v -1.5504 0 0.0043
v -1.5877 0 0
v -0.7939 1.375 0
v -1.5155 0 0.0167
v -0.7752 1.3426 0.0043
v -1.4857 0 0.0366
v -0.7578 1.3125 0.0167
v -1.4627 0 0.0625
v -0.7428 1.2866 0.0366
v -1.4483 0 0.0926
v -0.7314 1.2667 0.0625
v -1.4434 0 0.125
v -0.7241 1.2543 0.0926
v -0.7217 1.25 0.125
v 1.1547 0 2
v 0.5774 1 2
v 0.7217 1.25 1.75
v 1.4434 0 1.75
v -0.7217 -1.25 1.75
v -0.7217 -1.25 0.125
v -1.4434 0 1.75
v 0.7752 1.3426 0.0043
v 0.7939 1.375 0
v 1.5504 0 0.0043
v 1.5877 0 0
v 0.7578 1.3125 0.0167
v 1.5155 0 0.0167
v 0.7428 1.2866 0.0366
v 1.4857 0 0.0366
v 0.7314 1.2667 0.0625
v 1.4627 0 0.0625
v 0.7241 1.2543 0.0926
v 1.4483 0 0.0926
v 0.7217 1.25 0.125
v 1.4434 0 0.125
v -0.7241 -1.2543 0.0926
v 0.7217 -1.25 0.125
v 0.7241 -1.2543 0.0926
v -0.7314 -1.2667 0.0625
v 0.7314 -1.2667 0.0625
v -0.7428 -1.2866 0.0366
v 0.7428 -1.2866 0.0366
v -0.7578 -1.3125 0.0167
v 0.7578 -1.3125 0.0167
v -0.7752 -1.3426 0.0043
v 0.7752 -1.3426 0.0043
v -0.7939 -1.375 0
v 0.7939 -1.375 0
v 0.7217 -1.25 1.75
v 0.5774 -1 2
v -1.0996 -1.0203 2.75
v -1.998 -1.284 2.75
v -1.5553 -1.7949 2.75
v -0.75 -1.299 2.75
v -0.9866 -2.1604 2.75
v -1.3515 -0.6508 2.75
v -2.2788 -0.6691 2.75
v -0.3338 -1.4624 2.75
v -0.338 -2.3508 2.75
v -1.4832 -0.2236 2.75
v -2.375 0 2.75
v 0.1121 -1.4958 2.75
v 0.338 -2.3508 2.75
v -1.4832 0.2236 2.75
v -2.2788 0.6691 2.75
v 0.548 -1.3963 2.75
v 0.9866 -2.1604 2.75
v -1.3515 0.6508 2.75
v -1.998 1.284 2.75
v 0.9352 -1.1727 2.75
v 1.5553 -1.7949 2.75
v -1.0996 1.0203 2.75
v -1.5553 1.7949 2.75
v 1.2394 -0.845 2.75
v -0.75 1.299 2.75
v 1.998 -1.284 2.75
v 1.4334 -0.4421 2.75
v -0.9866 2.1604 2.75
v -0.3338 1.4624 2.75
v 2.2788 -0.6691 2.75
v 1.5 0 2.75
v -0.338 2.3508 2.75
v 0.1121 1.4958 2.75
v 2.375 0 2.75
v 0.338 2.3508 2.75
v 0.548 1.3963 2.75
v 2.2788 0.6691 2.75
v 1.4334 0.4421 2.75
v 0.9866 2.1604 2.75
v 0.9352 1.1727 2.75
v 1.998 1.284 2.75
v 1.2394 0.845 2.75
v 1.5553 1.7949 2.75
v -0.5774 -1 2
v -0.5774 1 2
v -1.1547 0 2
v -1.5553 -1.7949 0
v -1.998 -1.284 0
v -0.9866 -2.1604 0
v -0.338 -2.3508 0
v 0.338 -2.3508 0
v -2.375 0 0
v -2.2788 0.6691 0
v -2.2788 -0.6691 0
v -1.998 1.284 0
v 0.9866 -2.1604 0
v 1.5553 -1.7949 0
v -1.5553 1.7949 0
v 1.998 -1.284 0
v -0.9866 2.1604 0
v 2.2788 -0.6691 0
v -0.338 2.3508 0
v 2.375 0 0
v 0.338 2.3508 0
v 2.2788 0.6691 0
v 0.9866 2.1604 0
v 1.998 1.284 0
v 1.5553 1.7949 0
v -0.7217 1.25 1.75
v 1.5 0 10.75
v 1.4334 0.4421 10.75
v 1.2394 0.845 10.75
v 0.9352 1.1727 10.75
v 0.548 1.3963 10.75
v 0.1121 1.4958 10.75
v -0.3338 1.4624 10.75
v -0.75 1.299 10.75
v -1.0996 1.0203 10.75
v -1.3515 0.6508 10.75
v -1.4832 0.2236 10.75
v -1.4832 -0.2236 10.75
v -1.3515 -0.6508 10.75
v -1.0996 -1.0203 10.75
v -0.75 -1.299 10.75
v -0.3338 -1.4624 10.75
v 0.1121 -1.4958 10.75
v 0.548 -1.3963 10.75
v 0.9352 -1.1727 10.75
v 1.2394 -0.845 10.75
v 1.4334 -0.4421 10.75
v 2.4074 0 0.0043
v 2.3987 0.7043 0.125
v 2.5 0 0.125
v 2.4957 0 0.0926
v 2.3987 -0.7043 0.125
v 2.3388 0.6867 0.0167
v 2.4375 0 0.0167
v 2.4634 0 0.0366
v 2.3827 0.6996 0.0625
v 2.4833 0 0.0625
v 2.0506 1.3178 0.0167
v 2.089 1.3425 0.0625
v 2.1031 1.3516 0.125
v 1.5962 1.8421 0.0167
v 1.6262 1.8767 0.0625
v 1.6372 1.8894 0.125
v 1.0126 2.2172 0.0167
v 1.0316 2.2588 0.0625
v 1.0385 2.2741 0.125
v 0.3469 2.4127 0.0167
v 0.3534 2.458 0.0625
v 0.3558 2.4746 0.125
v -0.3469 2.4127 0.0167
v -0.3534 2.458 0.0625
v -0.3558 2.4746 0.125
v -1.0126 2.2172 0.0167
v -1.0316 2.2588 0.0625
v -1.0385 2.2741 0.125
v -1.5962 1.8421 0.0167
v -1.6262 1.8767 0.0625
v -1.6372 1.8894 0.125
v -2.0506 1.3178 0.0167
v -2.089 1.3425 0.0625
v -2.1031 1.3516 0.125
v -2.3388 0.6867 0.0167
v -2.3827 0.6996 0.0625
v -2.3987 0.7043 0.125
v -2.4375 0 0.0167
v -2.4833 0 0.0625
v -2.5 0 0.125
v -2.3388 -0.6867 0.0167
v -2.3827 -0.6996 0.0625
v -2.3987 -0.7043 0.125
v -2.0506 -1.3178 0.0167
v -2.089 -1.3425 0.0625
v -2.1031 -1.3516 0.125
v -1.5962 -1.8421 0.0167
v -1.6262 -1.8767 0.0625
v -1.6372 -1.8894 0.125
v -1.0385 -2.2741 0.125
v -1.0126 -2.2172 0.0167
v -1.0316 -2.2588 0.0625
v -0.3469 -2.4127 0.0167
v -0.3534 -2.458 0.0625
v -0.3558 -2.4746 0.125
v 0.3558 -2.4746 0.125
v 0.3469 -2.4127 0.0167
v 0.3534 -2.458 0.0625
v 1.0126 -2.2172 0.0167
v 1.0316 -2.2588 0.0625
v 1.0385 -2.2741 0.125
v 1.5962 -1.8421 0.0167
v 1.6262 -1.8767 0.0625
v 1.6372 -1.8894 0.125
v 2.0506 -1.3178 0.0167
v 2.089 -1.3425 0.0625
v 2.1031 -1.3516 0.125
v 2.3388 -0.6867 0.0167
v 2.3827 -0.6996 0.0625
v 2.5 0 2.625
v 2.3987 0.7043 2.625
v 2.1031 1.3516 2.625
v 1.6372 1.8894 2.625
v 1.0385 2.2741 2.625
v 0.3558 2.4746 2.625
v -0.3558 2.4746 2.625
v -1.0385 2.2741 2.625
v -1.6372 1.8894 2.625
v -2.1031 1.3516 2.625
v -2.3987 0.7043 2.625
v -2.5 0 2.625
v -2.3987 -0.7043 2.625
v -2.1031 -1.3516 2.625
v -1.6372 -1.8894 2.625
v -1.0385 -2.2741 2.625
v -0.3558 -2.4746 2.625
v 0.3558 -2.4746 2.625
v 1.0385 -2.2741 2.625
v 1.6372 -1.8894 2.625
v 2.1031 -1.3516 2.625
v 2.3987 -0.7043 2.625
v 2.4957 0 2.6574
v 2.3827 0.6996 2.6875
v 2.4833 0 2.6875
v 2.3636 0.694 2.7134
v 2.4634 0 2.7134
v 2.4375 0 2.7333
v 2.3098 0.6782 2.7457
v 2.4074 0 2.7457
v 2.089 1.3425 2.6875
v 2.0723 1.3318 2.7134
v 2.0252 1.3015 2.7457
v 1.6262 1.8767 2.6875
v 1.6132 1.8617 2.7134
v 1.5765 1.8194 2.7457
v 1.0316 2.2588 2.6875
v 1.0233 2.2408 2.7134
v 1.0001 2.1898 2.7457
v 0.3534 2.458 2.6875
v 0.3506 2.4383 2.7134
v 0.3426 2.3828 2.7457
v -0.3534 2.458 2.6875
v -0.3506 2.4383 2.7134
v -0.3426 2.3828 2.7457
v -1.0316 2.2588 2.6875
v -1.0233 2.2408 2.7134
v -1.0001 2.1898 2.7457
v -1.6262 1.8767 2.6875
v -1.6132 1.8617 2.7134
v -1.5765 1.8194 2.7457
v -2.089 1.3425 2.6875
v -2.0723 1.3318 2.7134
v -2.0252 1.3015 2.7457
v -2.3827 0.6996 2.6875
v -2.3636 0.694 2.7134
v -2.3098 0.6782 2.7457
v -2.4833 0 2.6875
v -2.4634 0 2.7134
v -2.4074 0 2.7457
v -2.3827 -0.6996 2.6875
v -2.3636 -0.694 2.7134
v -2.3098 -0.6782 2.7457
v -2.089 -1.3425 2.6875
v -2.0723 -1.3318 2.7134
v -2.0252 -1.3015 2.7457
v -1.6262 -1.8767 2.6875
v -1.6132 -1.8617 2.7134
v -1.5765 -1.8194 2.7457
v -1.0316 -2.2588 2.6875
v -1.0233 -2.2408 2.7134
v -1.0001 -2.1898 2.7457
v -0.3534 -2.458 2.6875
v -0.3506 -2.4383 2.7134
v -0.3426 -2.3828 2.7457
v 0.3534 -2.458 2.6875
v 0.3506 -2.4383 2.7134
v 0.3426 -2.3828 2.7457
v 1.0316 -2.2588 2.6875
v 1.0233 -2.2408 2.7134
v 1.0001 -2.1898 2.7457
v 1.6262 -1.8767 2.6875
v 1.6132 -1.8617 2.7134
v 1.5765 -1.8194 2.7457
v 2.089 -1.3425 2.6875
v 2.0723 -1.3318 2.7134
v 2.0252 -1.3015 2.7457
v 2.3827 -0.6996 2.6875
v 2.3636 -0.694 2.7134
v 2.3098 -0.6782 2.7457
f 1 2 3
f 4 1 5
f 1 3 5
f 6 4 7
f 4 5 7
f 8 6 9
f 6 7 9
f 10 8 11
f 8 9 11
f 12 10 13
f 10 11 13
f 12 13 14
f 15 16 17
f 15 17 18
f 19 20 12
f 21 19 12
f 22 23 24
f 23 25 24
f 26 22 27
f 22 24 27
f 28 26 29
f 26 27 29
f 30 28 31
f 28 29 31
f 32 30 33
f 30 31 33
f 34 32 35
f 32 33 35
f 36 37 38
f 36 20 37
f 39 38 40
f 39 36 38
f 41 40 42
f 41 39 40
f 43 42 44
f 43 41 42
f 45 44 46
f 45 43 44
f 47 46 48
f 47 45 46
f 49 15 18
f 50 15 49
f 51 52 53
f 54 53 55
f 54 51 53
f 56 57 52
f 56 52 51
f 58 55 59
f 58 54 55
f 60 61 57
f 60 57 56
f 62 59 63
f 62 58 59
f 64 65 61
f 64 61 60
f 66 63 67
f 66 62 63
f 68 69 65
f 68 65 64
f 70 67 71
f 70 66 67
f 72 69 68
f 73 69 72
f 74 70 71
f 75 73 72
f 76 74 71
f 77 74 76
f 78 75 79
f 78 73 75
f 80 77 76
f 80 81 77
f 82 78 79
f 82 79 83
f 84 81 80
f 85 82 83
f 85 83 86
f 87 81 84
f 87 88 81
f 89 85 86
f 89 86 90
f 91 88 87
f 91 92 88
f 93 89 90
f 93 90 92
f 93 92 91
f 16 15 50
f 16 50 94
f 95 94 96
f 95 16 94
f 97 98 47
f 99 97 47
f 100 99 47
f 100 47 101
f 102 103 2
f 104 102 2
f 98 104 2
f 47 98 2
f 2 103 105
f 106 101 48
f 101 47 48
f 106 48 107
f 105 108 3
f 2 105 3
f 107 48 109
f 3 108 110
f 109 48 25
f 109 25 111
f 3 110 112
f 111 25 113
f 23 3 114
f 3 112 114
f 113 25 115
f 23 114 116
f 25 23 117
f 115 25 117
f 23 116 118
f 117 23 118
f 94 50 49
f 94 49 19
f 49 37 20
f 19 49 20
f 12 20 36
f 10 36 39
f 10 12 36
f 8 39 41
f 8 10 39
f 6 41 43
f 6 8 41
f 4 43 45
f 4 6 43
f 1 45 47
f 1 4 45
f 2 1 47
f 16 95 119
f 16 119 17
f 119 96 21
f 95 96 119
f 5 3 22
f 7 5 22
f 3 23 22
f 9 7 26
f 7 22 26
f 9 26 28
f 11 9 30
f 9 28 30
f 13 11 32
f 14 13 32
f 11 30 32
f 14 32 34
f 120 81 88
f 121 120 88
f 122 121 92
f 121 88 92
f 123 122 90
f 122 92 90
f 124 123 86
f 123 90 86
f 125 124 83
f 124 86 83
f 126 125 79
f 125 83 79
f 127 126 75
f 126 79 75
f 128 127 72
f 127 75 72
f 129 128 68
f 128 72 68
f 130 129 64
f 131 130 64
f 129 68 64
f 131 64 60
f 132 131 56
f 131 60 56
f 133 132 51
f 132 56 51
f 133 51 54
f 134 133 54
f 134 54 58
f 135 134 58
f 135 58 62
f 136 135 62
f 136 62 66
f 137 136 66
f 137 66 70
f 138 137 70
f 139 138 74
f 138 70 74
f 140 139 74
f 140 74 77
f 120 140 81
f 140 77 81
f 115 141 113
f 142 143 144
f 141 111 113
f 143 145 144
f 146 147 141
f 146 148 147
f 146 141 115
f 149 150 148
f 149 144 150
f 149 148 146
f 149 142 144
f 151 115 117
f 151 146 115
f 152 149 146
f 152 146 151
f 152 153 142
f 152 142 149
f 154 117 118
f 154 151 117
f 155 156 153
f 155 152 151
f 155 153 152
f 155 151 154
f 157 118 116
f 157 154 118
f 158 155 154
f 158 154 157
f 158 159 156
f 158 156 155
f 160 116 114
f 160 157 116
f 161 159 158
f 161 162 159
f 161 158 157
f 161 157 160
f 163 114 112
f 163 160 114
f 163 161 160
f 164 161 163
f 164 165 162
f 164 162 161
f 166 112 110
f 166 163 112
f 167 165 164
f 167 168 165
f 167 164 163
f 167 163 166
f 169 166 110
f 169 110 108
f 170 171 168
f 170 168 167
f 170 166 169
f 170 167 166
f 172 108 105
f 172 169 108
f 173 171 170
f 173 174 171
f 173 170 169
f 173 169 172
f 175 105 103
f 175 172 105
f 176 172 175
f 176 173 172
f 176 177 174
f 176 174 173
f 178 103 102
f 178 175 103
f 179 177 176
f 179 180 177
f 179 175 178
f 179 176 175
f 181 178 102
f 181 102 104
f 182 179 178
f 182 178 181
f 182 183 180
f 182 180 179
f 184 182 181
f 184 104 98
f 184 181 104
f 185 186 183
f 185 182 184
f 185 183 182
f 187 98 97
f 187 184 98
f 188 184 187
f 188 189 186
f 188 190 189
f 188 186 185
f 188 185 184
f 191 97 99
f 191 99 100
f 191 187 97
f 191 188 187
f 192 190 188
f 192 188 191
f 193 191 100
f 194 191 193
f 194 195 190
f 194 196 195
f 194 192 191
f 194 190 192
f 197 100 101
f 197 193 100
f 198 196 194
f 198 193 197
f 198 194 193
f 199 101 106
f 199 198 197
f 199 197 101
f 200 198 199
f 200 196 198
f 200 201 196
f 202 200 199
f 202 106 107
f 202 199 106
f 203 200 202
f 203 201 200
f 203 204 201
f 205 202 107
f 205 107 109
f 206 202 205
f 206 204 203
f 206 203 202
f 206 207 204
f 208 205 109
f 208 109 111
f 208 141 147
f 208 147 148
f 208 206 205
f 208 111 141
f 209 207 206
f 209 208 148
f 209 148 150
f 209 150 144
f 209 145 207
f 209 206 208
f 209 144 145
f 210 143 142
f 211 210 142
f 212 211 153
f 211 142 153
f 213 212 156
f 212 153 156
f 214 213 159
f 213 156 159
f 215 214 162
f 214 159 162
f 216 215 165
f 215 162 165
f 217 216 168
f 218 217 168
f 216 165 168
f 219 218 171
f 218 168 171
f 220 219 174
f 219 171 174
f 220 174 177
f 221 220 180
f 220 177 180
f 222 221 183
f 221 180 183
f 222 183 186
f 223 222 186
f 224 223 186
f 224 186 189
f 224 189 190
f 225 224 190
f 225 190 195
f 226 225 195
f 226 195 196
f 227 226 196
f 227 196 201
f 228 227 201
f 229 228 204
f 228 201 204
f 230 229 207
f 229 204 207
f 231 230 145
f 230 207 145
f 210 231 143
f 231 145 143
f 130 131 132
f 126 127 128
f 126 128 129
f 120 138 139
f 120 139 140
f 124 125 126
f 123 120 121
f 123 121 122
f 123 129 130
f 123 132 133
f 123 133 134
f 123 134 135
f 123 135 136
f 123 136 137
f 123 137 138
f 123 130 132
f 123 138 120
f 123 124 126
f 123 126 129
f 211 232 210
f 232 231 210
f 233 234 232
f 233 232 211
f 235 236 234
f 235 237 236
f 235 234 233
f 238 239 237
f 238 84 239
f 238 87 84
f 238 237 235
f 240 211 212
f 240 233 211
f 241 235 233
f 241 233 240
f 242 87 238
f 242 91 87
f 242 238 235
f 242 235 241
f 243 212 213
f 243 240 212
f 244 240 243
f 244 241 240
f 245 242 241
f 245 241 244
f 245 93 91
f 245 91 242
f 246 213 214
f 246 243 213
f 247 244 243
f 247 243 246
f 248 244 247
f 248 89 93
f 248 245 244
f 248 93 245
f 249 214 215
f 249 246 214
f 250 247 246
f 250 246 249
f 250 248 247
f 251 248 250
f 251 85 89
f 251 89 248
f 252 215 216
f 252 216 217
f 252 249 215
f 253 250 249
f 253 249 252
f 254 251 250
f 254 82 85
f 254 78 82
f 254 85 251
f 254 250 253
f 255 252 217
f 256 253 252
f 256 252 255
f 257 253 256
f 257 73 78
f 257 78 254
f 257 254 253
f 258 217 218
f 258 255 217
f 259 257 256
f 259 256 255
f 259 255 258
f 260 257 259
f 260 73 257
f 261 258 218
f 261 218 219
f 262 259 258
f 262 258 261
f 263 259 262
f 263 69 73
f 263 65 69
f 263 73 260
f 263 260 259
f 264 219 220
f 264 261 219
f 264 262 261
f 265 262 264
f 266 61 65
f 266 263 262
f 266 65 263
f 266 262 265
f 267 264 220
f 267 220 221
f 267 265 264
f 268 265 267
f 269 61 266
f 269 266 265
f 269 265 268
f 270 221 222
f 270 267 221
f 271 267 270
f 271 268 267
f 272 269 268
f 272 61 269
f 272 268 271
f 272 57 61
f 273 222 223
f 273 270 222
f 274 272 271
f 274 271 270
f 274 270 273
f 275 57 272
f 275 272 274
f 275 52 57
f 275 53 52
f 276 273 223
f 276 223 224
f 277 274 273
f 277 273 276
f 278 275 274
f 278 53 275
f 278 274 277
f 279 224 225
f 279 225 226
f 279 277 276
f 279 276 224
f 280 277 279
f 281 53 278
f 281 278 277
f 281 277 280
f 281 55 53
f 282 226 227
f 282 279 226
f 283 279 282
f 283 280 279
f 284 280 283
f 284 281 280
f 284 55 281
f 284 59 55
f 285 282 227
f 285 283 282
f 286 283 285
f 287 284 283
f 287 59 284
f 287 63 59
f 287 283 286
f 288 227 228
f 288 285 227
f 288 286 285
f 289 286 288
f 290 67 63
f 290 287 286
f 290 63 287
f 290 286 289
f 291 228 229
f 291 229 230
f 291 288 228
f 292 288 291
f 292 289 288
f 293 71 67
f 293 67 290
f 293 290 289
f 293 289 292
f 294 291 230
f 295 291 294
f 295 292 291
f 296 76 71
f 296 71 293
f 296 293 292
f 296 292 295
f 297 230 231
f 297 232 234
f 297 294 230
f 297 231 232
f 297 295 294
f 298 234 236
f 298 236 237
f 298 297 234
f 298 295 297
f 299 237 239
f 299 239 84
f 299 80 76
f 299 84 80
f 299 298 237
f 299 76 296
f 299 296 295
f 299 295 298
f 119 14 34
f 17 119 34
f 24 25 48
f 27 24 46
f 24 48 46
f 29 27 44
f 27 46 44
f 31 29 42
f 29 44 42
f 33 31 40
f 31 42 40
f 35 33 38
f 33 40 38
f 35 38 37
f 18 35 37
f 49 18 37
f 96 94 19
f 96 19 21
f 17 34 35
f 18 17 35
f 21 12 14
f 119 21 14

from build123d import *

# Parameters (mm, degrees)
SKETCH1_R           = 2.5
BOSS_EXTRUDE1_DEPTH = 2.75
SKETCH2_R           = 1.5
BOSS_EXTRUDE2_DEPTH = 8
CUT_EXTRUDE1_DEPTH  = 2
CHAMFER1_SIZE       = 0.25
FILLET1_R           = 0.125


with BuildPart() as part:
    # Sketch1 → Boss-Extrude1 (new body)
    with BuildSketch(Plane.XY):
        Circle(SKETCH1_R)
    extrude(amount=BOSS_EXTRUDE1_DEPTH)

    # Sketch2 → Boss-Extrude2 (add)
    with BuildSketch(Plane.XY.offset(2.75)):
        Circle(SKETCH2_R)
    extrude(amount=BOSS_EXTRUDE2_DEPTH)

    # Sketch3 → Cut-Extrude1 (cut)
    with BuildSketch(Plane(origin=(0, 0, 0), x_dir=(-1, 0, 0), z_dir=(0, 0, -1))):
        Polygon((1.443375673, 0), (0.721687836, 1.25), (-0.721687836, 1.25), (-1.443375673, 0), (-0.721687836, -1.25), (0.721687836, -1.25), align=None)
    extrude(amount=-CUT_EXTRUDE1_DEPTH, mode=Mode.SUBTRACT)

    # Chamfer1
    chamfer1_edges = [part.edges().sort_by_distance(p)[0] for p in [
        (-1.082531755, -0.625, 2),
        (0, -1.25, 2),
        (1.082531755, -0.625, 2),
        (1.082531755, 0.625, 2),
        (0, 1.25, 2),
        (-1.082531755, 0.625, 2),
    ]]
    chamfer(chamfer1_edges, length=CHAMFER1_SIZE)

    # Fillet1
    fillet1_edges = [part.edges().sort_by_distance(p)[0] for p in [
        (-1.082531755, -0.625, 0),
        (-1.082531755, 0.625, 0),
        (0, 1.25, 0),
        (1.082531755, 0.625, 0),
        (1.082531755, -0.625, 0),
        (0, -1.25, 0),
        (-2.5, 0, 0),
        (-2.5, 0, 2.75),
    ]]
    fillet(fillet1_edges, radius=FILLET1_R)


solid = part.part
